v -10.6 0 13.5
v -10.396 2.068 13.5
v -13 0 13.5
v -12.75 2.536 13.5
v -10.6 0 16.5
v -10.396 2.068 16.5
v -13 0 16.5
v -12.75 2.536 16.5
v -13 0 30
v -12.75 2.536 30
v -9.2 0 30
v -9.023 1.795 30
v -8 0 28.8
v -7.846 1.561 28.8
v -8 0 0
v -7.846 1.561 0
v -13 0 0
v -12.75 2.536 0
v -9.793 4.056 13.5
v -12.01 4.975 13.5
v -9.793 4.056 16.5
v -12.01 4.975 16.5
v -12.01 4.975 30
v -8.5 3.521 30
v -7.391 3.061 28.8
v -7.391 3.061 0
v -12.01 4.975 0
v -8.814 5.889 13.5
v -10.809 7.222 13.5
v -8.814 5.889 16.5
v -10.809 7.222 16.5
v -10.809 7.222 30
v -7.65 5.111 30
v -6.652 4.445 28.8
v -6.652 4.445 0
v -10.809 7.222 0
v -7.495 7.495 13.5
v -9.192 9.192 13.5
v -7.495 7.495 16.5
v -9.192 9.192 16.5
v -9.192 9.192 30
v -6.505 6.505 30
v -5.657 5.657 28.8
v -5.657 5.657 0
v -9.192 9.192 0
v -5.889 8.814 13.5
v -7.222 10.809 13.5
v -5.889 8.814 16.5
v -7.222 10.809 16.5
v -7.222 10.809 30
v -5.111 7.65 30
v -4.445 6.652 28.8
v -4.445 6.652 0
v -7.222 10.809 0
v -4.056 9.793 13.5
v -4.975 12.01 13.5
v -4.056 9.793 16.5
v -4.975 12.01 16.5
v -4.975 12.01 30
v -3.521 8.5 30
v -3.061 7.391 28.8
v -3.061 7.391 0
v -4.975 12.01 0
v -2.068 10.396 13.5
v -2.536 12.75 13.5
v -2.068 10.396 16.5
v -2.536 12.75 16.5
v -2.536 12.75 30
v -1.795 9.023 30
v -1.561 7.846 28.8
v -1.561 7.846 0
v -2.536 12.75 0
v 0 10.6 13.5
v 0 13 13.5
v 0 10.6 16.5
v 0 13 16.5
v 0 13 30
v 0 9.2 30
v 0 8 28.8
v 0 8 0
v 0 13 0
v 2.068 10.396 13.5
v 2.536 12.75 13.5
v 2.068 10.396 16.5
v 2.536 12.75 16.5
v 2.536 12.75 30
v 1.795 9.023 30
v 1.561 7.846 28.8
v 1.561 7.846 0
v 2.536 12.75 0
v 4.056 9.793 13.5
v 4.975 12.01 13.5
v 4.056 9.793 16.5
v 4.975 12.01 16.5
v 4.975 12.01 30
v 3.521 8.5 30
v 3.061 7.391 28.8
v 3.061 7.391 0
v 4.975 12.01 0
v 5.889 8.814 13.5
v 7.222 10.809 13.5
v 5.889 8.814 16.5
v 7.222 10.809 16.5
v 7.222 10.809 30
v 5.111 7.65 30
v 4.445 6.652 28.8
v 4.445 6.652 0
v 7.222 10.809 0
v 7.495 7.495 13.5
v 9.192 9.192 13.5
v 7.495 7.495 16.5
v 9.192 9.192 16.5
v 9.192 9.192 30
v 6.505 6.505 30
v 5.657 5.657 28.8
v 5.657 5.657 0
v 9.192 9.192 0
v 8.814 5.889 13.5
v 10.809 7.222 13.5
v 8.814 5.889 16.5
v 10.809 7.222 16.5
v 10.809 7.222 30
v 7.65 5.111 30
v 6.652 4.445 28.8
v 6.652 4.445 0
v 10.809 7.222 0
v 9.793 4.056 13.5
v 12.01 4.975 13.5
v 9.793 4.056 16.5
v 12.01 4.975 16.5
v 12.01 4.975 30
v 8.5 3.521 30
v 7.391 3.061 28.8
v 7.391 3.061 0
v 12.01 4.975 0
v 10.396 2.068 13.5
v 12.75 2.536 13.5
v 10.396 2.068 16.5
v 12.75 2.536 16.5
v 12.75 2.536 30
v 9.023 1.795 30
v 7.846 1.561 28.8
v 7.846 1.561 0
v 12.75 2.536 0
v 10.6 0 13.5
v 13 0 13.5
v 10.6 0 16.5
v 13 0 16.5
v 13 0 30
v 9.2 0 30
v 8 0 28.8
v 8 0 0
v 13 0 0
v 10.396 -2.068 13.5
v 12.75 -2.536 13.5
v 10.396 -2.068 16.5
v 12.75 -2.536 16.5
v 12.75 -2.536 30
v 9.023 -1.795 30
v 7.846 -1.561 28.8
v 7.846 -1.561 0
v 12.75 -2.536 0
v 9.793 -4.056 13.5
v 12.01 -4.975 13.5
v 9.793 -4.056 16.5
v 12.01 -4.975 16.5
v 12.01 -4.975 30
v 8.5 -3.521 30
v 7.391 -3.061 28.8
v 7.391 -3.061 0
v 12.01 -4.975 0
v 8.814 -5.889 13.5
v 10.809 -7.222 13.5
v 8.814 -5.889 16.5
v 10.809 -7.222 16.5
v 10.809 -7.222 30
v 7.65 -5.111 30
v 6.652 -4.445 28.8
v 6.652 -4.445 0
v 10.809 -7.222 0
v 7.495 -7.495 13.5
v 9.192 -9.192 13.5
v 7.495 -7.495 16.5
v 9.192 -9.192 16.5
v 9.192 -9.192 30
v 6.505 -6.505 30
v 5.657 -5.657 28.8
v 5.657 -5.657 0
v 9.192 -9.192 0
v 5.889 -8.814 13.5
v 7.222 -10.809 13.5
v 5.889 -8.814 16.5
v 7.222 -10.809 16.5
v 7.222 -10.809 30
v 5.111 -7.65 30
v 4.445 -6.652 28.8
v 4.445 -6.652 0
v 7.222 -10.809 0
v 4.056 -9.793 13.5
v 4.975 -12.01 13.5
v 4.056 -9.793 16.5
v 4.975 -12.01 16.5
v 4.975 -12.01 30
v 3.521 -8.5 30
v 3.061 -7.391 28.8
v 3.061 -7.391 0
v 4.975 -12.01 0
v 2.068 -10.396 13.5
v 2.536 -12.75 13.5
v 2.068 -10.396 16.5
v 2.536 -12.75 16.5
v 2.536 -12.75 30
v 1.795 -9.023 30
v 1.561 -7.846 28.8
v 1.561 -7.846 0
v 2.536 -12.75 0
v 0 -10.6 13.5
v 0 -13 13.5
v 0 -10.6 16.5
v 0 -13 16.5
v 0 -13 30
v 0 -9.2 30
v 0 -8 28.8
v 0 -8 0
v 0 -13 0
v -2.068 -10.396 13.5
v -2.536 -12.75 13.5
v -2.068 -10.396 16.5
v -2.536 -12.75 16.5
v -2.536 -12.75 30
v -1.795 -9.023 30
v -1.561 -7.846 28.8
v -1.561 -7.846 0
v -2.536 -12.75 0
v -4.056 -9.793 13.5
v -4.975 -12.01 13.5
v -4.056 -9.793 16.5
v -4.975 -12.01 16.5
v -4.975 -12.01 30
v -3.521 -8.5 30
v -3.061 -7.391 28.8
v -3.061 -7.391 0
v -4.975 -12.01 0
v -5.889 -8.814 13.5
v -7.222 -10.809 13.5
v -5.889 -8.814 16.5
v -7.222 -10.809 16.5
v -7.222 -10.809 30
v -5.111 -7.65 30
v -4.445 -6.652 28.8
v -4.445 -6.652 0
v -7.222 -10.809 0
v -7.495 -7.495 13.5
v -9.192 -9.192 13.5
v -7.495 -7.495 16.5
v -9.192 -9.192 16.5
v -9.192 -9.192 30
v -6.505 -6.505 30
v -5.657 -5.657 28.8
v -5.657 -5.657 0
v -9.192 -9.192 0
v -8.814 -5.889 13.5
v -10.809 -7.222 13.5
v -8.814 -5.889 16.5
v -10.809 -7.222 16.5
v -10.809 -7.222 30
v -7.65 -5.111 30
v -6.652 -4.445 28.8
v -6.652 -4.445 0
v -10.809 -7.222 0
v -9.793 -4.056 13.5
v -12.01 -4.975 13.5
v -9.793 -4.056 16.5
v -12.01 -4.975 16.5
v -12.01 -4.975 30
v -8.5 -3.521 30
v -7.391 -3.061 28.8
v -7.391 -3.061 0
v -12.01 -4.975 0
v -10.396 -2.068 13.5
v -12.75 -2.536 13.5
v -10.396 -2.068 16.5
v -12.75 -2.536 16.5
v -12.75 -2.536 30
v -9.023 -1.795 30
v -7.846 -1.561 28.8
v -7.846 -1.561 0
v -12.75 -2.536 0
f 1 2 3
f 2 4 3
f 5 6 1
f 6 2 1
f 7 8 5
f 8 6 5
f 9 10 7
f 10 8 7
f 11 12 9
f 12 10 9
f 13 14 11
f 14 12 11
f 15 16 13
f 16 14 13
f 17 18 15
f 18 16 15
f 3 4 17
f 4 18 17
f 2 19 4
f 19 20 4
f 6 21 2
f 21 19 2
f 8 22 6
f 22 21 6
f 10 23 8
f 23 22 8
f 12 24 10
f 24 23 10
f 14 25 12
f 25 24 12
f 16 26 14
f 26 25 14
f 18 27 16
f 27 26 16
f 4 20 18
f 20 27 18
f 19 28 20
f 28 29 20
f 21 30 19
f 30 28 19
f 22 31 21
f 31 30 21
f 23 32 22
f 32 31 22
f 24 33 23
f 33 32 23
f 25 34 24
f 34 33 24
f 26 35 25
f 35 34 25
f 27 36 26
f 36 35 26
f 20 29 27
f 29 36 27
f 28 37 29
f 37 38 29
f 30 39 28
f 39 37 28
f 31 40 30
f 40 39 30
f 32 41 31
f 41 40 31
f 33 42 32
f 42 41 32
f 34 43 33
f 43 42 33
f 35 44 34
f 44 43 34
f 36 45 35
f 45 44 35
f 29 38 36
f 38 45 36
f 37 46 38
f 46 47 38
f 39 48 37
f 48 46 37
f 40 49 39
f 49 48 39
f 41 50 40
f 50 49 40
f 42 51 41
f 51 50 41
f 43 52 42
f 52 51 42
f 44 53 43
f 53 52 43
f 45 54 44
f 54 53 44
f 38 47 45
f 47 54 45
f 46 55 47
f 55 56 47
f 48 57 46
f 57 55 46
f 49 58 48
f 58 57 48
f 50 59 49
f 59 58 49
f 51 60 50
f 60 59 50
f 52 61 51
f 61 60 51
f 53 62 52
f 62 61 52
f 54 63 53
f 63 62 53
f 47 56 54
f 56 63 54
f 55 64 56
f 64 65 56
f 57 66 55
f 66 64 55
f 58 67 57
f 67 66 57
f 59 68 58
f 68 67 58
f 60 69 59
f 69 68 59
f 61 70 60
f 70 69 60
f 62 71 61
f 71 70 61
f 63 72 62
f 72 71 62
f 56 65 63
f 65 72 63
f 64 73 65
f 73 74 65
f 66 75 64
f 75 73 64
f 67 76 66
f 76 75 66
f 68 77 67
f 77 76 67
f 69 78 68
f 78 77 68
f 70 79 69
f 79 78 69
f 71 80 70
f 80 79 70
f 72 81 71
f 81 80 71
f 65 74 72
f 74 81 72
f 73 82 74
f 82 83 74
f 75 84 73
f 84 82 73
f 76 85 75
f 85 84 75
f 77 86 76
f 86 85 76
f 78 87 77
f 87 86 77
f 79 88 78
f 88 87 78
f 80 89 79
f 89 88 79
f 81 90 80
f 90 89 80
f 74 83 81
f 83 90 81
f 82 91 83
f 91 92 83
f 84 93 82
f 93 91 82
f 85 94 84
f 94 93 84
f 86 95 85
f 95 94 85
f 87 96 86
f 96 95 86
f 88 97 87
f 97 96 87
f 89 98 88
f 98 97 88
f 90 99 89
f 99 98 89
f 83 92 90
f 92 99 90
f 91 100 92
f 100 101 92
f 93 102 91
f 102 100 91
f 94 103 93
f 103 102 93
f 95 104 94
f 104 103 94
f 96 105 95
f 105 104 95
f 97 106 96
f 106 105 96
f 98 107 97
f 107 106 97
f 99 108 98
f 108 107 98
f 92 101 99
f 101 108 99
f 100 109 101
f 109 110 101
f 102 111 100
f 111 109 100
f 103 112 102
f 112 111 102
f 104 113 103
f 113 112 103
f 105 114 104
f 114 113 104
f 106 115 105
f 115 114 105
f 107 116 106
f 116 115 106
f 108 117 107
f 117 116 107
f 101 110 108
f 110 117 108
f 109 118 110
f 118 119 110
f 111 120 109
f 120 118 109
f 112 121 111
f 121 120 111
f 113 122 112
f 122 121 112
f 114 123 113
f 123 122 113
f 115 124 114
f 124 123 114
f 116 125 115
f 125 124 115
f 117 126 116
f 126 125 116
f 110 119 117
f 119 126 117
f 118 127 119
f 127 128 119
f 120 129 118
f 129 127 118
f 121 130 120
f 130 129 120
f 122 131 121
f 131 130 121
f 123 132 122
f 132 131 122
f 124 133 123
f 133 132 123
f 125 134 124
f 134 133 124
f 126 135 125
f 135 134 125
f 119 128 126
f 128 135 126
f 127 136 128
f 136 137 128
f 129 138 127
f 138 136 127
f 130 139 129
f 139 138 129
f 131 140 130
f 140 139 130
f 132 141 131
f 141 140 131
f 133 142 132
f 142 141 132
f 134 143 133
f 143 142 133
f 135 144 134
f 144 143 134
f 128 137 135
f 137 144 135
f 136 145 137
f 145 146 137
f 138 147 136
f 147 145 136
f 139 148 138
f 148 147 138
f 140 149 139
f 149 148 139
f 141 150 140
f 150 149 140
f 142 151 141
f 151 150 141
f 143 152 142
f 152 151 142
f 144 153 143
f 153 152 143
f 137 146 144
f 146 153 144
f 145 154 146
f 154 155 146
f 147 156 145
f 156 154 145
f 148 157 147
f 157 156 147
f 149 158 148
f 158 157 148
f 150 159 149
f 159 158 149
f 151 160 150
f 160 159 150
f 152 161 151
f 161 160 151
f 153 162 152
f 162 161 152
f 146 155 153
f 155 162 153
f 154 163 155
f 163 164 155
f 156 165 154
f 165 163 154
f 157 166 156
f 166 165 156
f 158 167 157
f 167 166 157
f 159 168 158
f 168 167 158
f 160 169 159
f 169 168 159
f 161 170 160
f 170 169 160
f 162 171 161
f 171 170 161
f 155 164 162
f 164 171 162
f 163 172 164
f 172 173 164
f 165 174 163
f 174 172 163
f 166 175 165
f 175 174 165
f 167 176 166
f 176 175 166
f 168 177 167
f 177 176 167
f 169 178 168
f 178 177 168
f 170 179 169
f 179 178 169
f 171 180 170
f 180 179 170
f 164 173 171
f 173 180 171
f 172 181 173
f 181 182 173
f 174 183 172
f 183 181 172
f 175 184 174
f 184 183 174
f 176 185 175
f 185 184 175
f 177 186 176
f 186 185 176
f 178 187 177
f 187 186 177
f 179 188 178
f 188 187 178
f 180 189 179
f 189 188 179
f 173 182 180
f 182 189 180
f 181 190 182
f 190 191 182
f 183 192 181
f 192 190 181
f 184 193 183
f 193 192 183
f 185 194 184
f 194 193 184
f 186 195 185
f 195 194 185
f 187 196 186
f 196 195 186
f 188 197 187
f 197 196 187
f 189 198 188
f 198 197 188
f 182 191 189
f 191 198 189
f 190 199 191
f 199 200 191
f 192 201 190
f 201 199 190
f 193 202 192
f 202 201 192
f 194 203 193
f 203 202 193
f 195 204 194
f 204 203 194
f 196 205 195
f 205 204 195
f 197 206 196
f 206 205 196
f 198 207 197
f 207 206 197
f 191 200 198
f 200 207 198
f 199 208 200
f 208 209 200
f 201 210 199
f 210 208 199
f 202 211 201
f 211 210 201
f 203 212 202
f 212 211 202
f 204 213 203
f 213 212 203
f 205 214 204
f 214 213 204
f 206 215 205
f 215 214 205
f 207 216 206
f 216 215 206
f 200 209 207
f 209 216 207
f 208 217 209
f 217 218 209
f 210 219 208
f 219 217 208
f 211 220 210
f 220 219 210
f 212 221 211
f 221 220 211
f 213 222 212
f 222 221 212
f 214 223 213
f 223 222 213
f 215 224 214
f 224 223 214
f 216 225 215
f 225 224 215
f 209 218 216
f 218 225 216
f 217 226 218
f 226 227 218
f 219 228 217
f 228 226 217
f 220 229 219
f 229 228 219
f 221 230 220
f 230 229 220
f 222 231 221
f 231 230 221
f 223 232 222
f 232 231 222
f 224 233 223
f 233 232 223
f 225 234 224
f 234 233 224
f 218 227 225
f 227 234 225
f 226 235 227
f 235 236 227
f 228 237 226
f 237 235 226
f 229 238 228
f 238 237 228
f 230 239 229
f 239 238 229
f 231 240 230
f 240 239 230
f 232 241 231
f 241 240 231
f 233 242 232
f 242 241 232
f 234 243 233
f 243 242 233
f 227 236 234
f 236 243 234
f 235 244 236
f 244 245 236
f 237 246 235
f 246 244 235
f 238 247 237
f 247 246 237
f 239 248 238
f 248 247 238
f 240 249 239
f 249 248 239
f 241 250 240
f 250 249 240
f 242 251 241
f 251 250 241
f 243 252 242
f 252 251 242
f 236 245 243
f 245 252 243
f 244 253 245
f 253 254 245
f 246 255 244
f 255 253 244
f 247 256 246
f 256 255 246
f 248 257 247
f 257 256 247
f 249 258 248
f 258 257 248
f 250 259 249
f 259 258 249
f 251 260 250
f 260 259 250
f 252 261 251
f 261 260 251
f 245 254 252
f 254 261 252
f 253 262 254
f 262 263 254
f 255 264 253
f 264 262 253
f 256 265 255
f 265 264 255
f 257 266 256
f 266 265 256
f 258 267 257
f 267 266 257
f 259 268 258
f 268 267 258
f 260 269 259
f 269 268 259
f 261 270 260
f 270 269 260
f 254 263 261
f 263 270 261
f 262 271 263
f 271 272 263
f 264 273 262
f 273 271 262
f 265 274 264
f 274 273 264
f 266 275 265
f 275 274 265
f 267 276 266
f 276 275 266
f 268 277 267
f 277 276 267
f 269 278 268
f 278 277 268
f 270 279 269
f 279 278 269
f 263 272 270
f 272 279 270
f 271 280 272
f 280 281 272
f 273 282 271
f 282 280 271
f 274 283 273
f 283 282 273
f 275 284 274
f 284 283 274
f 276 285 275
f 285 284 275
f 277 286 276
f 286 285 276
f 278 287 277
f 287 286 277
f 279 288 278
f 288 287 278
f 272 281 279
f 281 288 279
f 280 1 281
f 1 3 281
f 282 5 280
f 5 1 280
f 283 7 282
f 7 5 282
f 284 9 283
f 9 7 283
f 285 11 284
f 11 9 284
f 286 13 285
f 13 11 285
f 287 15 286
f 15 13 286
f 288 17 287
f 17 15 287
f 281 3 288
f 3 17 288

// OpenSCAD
$fn = 32;

// ----------------------------------------------------------------------
// Grooved revolve: thread_relief, bore R8
// ----------------------------------------------------------------------

// --- parameters (mm) ---
bore_r = 8;               // bore radius
outer_r = 13;             // outer radius of the body
total_h = 30;             // overall height, Z
wall = 5;                 // radial wall thickness
groove_w = 3;             // groove width
groove_d = 2.4;           // groove depth
grooves = 1;              // number of outer grooves
relief = 1.2;             // thread relief leg at the bore mouth
relief_angle = 45;        // thread relief chamfer angle, degrees

bbox_x = 2 * outer_r;  // full diameter
bore_d = 2 * bore_r;  // bore diameter
body_d = 2 * outer_r;  // body diameter
revolve_angle = 360;  // full turn around the Z axis

profile = [[8, 0], [13, 0], [13, 13.5], [10.6, 13.5], [10.6, 16.5], [13, 16.5], [13, 30], [9.2, 30], [8, 28.8]];  // primary outline, 9 points, counter clockwise

// --- the one profile operation ---
rotate_extrude(angle = revolve_angle) polygon(points = profile);
